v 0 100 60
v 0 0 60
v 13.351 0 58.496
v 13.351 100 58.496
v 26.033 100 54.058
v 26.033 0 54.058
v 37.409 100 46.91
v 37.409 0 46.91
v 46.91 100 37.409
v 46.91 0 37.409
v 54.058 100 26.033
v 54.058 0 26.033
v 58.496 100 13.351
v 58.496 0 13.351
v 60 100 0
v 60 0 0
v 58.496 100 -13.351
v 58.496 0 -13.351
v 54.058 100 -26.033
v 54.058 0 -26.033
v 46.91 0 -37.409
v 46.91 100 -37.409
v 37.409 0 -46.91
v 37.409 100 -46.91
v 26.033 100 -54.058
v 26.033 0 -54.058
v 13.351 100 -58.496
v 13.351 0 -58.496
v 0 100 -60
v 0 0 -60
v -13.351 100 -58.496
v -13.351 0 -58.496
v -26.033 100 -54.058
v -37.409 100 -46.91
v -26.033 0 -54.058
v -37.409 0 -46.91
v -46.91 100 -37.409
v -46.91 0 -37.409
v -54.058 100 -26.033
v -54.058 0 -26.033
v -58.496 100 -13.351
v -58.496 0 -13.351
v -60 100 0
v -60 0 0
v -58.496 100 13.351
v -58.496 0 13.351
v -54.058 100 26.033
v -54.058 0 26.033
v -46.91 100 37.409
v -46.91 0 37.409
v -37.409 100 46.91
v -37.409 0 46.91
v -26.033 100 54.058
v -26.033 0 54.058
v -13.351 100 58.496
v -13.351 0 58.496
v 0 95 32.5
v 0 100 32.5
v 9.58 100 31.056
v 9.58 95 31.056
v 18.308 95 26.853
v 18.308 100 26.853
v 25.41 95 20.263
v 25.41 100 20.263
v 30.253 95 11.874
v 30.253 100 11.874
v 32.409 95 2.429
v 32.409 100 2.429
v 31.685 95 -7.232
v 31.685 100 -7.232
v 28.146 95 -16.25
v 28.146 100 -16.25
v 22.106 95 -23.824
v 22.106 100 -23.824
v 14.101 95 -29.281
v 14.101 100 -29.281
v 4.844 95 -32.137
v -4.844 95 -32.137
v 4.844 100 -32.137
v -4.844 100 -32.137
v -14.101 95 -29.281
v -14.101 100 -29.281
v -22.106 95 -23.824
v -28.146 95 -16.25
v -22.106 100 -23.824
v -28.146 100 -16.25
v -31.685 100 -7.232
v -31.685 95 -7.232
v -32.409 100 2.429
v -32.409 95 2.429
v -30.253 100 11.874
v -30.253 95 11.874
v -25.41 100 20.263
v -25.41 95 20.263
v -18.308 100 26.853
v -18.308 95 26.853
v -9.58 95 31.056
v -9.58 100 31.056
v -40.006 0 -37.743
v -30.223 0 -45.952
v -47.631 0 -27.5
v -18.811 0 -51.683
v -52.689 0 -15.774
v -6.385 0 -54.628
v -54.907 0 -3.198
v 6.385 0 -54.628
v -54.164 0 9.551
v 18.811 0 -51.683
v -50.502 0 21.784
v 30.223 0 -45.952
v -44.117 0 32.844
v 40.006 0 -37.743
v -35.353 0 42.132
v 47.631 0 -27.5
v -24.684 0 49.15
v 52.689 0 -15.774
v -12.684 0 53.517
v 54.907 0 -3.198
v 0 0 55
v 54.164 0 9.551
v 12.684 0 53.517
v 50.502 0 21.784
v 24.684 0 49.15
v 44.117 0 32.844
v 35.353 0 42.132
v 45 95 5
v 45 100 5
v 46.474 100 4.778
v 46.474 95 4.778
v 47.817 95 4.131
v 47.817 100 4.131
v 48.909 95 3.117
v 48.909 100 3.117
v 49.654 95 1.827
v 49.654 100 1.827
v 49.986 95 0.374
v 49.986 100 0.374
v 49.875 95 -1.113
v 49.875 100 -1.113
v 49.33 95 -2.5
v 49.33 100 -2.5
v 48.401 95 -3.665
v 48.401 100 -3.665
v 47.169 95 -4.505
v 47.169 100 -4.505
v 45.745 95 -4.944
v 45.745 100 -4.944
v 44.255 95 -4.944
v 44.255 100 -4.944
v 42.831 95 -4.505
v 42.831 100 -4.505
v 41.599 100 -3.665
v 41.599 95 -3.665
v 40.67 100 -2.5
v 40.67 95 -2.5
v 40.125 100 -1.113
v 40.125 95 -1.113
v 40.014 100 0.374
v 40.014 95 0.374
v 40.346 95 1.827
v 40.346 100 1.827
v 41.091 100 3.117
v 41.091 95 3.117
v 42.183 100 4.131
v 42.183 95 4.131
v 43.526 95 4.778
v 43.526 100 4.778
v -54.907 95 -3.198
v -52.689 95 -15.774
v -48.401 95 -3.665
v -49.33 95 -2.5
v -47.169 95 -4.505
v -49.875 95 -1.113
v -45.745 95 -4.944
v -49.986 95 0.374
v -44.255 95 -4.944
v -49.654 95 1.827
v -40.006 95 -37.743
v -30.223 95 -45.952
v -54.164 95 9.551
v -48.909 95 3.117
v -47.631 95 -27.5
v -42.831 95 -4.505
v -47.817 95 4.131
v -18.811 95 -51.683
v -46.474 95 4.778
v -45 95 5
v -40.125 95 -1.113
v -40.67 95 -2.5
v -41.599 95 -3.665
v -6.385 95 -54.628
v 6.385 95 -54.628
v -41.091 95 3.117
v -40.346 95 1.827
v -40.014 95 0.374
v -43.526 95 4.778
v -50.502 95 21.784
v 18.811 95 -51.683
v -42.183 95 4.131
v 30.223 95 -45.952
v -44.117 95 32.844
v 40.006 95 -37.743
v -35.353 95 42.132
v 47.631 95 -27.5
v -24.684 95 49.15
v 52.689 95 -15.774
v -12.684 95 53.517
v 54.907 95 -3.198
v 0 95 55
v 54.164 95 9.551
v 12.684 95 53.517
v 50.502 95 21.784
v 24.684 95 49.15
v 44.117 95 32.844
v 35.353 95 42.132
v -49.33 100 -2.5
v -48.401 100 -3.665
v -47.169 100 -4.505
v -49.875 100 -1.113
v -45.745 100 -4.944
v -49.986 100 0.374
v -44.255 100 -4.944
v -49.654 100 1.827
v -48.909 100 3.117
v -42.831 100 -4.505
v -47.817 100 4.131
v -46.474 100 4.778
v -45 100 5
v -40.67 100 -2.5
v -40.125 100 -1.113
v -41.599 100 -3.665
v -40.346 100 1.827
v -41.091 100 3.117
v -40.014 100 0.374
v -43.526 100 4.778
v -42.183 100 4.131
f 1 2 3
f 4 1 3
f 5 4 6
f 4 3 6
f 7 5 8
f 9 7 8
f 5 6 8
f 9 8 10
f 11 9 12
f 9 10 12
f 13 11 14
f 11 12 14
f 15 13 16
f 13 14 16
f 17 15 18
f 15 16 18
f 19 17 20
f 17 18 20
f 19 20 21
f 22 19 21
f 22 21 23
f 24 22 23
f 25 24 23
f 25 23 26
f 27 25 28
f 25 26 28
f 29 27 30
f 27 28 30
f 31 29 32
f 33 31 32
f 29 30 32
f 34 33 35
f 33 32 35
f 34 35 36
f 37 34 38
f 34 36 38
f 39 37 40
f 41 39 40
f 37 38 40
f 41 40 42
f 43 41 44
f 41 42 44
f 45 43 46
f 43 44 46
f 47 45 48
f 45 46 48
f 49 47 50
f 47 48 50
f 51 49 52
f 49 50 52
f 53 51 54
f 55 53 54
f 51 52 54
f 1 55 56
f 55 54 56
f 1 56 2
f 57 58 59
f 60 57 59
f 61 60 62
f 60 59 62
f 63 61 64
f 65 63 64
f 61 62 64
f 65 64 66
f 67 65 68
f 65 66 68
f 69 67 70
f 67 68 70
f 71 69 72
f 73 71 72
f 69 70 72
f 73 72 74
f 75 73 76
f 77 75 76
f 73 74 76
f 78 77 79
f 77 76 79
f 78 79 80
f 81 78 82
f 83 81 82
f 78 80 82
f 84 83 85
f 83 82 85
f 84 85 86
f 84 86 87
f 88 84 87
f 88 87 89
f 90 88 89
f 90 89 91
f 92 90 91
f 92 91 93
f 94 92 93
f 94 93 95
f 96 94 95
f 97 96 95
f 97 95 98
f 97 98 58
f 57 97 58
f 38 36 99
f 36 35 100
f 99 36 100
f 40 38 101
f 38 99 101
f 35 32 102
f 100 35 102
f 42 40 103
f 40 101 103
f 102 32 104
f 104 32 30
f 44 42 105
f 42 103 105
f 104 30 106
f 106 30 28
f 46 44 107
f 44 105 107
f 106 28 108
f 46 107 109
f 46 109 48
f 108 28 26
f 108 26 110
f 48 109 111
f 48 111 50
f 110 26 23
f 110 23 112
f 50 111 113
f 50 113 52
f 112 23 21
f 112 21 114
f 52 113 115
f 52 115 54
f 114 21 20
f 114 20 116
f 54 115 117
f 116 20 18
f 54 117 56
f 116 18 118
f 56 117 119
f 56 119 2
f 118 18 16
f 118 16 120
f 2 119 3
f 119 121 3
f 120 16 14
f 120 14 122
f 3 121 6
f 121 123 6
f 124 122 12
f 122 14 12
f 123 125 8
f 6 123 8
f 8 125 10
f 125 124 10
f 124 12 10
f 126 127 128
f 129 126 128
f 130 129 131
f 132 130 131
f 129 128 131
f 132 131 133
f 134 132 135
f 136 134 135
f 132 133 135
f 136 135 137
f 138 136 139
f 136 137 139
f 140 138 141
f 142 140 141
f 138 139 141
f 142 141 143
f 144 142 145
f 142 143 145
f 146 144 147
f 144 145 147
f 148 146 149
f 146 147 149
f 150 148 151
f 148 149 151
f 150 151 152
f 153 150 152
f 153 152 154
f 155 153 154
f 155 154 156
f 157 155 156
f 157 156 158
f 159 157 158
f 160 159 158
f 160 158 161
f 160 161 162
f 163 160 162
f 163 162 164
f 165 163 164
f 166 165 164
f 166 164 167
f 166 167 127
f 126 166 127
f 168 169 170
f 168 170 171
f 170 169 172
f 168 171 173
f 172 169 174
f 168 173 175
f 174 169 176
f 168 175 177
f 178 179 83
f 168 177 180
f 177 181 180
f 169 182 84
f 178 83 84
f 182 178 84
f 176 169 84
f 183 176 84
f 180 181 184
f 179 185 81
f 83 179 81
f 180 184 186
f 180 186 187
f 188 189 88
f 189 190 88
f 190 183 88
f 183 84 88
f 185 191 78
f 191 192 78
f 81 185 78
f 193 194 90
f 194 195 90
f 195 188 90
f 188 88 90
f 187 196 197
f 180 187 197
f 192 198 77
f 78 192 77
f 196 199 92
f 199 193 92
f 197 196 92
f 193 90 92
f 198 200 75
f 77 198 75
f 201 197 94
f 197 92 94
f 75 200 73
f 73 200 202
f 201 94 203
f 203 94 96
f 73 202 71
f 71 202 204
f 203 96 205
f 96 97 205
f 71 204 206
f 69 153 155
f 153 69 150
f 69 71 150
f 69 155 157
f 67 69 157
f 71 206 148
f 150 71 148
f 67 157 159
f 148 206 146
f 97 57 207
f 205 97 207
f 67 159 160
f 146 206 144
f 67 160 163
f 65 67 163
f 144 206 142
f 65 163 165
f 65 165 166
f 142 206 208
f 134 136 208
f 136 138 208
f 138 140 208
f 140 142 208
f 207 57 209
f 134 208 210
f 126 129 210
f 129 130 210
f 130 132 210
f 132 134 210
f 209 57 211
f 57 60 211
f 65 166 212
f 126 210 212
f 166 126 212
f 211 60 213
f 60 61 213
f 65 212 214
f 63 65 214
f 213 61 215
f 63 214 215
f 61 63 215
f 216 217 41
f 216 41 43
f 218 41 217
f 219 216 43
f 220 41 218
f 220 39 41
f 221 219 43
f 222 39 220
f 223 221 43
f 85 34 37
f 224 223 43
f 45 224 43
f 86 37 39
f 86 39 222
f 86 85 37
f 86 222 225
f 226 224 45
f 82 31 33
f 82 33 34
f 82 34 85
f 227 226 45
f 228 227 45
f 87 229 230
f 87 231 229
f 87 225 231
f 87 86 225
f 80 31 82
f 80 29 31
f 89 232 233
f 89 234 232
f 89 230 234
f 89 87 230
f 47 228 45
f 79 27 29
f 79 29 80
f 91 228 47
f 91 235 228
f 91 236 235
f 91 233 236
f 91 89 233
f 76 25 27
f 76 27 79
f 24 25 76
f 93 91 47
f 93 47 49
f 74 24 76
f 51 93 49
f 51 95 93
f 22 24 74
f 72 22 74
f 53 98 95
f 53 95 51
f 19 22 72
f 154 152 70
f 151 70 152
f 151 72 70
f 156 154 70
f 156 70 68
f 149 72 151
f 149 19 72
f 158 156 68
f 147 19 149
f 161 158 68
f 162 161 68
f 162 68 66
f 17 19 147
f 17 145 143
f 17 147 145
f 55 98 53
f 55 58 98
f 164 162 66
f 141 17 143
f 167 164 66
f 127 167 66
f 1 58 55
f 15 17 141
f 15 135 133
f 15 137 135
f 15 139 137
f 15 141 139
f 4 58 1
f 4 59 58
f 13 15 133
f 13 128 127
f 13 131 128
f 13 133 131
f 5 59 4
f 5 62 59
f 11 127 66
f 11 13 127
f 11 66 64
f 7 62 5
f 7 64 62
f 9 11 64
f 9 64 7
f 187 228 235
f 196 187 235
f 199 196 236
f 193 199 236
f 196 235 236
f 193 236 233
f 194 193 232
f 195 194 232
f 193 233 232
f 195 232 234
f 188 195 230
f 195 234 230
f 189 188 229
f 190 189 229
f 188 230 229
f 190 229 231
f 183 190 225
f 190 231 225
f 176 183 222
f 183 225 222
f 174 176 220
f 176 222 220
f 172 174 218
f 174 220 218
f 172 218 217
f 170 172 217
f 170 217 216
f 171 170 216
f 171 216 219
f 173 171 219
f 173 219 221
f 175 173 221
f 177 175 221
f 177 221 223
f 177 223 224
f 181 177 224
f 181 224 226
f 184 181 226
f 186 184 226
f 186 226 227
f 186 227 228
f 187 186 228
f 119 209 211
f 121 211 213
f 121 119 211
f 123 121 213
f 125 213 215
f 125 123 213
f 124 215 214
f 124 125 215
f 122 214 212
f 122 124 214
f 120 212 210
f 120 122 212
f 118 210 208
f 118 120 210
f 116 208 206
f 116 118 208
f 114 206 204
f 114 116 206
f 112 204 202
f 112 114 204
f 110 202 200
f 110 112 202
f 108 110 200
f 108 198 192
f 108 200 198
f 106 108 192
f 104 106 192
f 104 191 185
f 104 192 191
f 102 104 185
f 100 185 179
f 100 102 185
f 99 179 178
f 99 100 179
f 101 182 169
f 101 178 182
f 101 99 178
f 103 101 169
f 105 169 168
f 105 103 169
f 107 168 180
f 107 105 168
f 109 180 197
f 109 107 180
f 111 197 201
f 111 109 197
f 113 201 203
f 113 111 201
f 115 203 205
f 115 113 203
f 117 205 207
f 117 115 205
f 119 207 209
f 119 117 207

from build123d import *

# Parameters (mm, degrees)
SKETCH1_R           = 60
BOSS_EXTRUDE1_DEPTH = 100
SHELL1_T            = -5
SKETCH3_R           = 32.5
CUT_EXTRUDE1_DEPTH  = 132.148770486
SKETCH4_R           = 5
CUT_EXTRUDE2_DEPTH  = 132.148770486


with BuildPart() as part:
    # Sketch1 → Boss-Extrude1 (new body)
    with BuildSketch(Plane(origin=(0, 0, 0), x_dir=(1, 0, 0), z_dir=(0, 1, 0))):
        with Locations(Location((0, 0, 0), (0, 0, 270))):
            Circle(SKETCH1_R)
    extrude(amount=BOSS_EXTRUDE1_DEPTH)

    # Shell1
    shell1_openings = [part.faces().sort_by_distance(p)[0] for p in [
        (0, 0, 0),
    ]]
    offset(amount=SHELL1_T, openings=shell1_openings, kind=Kind.INTERSECTION)

    # Sketch3 → Cut-Extrude1 (cut, through all)
    with BuildSketch(Plane(origin=(0, 100, 0), x_dir=(1, 0, 0), z_dir=(0, 1, 0))):
        with Locations(Location((0, 0, 0), (0, 0, 270))):
            Circle(SKETCH3_R)
    extrude(amount=-CUT_EXTRUDE1_DEPTH, mode=Mode.SUBTRACT)

    # Sketch4 → Cut-Extrude2 (cut, through all)
    with BuildSketch(Plane(origin=(0, 100, 0), x_dir=(1, 0, 0), z_dir=(0, 1, 0))):
        with Locations(Location((45, 0, 0), (0, 0, 270))):
            Circle(SKETCH4_R)
        with Locations(Location((-45, 0, 0), (0, 0, 270))):
            Circle(SKETCH4_R)
    extrude(amount=-CUT_EXTRUDE2_DEPTH, mode=Mode.SUBTRACT)


solid = part.part
